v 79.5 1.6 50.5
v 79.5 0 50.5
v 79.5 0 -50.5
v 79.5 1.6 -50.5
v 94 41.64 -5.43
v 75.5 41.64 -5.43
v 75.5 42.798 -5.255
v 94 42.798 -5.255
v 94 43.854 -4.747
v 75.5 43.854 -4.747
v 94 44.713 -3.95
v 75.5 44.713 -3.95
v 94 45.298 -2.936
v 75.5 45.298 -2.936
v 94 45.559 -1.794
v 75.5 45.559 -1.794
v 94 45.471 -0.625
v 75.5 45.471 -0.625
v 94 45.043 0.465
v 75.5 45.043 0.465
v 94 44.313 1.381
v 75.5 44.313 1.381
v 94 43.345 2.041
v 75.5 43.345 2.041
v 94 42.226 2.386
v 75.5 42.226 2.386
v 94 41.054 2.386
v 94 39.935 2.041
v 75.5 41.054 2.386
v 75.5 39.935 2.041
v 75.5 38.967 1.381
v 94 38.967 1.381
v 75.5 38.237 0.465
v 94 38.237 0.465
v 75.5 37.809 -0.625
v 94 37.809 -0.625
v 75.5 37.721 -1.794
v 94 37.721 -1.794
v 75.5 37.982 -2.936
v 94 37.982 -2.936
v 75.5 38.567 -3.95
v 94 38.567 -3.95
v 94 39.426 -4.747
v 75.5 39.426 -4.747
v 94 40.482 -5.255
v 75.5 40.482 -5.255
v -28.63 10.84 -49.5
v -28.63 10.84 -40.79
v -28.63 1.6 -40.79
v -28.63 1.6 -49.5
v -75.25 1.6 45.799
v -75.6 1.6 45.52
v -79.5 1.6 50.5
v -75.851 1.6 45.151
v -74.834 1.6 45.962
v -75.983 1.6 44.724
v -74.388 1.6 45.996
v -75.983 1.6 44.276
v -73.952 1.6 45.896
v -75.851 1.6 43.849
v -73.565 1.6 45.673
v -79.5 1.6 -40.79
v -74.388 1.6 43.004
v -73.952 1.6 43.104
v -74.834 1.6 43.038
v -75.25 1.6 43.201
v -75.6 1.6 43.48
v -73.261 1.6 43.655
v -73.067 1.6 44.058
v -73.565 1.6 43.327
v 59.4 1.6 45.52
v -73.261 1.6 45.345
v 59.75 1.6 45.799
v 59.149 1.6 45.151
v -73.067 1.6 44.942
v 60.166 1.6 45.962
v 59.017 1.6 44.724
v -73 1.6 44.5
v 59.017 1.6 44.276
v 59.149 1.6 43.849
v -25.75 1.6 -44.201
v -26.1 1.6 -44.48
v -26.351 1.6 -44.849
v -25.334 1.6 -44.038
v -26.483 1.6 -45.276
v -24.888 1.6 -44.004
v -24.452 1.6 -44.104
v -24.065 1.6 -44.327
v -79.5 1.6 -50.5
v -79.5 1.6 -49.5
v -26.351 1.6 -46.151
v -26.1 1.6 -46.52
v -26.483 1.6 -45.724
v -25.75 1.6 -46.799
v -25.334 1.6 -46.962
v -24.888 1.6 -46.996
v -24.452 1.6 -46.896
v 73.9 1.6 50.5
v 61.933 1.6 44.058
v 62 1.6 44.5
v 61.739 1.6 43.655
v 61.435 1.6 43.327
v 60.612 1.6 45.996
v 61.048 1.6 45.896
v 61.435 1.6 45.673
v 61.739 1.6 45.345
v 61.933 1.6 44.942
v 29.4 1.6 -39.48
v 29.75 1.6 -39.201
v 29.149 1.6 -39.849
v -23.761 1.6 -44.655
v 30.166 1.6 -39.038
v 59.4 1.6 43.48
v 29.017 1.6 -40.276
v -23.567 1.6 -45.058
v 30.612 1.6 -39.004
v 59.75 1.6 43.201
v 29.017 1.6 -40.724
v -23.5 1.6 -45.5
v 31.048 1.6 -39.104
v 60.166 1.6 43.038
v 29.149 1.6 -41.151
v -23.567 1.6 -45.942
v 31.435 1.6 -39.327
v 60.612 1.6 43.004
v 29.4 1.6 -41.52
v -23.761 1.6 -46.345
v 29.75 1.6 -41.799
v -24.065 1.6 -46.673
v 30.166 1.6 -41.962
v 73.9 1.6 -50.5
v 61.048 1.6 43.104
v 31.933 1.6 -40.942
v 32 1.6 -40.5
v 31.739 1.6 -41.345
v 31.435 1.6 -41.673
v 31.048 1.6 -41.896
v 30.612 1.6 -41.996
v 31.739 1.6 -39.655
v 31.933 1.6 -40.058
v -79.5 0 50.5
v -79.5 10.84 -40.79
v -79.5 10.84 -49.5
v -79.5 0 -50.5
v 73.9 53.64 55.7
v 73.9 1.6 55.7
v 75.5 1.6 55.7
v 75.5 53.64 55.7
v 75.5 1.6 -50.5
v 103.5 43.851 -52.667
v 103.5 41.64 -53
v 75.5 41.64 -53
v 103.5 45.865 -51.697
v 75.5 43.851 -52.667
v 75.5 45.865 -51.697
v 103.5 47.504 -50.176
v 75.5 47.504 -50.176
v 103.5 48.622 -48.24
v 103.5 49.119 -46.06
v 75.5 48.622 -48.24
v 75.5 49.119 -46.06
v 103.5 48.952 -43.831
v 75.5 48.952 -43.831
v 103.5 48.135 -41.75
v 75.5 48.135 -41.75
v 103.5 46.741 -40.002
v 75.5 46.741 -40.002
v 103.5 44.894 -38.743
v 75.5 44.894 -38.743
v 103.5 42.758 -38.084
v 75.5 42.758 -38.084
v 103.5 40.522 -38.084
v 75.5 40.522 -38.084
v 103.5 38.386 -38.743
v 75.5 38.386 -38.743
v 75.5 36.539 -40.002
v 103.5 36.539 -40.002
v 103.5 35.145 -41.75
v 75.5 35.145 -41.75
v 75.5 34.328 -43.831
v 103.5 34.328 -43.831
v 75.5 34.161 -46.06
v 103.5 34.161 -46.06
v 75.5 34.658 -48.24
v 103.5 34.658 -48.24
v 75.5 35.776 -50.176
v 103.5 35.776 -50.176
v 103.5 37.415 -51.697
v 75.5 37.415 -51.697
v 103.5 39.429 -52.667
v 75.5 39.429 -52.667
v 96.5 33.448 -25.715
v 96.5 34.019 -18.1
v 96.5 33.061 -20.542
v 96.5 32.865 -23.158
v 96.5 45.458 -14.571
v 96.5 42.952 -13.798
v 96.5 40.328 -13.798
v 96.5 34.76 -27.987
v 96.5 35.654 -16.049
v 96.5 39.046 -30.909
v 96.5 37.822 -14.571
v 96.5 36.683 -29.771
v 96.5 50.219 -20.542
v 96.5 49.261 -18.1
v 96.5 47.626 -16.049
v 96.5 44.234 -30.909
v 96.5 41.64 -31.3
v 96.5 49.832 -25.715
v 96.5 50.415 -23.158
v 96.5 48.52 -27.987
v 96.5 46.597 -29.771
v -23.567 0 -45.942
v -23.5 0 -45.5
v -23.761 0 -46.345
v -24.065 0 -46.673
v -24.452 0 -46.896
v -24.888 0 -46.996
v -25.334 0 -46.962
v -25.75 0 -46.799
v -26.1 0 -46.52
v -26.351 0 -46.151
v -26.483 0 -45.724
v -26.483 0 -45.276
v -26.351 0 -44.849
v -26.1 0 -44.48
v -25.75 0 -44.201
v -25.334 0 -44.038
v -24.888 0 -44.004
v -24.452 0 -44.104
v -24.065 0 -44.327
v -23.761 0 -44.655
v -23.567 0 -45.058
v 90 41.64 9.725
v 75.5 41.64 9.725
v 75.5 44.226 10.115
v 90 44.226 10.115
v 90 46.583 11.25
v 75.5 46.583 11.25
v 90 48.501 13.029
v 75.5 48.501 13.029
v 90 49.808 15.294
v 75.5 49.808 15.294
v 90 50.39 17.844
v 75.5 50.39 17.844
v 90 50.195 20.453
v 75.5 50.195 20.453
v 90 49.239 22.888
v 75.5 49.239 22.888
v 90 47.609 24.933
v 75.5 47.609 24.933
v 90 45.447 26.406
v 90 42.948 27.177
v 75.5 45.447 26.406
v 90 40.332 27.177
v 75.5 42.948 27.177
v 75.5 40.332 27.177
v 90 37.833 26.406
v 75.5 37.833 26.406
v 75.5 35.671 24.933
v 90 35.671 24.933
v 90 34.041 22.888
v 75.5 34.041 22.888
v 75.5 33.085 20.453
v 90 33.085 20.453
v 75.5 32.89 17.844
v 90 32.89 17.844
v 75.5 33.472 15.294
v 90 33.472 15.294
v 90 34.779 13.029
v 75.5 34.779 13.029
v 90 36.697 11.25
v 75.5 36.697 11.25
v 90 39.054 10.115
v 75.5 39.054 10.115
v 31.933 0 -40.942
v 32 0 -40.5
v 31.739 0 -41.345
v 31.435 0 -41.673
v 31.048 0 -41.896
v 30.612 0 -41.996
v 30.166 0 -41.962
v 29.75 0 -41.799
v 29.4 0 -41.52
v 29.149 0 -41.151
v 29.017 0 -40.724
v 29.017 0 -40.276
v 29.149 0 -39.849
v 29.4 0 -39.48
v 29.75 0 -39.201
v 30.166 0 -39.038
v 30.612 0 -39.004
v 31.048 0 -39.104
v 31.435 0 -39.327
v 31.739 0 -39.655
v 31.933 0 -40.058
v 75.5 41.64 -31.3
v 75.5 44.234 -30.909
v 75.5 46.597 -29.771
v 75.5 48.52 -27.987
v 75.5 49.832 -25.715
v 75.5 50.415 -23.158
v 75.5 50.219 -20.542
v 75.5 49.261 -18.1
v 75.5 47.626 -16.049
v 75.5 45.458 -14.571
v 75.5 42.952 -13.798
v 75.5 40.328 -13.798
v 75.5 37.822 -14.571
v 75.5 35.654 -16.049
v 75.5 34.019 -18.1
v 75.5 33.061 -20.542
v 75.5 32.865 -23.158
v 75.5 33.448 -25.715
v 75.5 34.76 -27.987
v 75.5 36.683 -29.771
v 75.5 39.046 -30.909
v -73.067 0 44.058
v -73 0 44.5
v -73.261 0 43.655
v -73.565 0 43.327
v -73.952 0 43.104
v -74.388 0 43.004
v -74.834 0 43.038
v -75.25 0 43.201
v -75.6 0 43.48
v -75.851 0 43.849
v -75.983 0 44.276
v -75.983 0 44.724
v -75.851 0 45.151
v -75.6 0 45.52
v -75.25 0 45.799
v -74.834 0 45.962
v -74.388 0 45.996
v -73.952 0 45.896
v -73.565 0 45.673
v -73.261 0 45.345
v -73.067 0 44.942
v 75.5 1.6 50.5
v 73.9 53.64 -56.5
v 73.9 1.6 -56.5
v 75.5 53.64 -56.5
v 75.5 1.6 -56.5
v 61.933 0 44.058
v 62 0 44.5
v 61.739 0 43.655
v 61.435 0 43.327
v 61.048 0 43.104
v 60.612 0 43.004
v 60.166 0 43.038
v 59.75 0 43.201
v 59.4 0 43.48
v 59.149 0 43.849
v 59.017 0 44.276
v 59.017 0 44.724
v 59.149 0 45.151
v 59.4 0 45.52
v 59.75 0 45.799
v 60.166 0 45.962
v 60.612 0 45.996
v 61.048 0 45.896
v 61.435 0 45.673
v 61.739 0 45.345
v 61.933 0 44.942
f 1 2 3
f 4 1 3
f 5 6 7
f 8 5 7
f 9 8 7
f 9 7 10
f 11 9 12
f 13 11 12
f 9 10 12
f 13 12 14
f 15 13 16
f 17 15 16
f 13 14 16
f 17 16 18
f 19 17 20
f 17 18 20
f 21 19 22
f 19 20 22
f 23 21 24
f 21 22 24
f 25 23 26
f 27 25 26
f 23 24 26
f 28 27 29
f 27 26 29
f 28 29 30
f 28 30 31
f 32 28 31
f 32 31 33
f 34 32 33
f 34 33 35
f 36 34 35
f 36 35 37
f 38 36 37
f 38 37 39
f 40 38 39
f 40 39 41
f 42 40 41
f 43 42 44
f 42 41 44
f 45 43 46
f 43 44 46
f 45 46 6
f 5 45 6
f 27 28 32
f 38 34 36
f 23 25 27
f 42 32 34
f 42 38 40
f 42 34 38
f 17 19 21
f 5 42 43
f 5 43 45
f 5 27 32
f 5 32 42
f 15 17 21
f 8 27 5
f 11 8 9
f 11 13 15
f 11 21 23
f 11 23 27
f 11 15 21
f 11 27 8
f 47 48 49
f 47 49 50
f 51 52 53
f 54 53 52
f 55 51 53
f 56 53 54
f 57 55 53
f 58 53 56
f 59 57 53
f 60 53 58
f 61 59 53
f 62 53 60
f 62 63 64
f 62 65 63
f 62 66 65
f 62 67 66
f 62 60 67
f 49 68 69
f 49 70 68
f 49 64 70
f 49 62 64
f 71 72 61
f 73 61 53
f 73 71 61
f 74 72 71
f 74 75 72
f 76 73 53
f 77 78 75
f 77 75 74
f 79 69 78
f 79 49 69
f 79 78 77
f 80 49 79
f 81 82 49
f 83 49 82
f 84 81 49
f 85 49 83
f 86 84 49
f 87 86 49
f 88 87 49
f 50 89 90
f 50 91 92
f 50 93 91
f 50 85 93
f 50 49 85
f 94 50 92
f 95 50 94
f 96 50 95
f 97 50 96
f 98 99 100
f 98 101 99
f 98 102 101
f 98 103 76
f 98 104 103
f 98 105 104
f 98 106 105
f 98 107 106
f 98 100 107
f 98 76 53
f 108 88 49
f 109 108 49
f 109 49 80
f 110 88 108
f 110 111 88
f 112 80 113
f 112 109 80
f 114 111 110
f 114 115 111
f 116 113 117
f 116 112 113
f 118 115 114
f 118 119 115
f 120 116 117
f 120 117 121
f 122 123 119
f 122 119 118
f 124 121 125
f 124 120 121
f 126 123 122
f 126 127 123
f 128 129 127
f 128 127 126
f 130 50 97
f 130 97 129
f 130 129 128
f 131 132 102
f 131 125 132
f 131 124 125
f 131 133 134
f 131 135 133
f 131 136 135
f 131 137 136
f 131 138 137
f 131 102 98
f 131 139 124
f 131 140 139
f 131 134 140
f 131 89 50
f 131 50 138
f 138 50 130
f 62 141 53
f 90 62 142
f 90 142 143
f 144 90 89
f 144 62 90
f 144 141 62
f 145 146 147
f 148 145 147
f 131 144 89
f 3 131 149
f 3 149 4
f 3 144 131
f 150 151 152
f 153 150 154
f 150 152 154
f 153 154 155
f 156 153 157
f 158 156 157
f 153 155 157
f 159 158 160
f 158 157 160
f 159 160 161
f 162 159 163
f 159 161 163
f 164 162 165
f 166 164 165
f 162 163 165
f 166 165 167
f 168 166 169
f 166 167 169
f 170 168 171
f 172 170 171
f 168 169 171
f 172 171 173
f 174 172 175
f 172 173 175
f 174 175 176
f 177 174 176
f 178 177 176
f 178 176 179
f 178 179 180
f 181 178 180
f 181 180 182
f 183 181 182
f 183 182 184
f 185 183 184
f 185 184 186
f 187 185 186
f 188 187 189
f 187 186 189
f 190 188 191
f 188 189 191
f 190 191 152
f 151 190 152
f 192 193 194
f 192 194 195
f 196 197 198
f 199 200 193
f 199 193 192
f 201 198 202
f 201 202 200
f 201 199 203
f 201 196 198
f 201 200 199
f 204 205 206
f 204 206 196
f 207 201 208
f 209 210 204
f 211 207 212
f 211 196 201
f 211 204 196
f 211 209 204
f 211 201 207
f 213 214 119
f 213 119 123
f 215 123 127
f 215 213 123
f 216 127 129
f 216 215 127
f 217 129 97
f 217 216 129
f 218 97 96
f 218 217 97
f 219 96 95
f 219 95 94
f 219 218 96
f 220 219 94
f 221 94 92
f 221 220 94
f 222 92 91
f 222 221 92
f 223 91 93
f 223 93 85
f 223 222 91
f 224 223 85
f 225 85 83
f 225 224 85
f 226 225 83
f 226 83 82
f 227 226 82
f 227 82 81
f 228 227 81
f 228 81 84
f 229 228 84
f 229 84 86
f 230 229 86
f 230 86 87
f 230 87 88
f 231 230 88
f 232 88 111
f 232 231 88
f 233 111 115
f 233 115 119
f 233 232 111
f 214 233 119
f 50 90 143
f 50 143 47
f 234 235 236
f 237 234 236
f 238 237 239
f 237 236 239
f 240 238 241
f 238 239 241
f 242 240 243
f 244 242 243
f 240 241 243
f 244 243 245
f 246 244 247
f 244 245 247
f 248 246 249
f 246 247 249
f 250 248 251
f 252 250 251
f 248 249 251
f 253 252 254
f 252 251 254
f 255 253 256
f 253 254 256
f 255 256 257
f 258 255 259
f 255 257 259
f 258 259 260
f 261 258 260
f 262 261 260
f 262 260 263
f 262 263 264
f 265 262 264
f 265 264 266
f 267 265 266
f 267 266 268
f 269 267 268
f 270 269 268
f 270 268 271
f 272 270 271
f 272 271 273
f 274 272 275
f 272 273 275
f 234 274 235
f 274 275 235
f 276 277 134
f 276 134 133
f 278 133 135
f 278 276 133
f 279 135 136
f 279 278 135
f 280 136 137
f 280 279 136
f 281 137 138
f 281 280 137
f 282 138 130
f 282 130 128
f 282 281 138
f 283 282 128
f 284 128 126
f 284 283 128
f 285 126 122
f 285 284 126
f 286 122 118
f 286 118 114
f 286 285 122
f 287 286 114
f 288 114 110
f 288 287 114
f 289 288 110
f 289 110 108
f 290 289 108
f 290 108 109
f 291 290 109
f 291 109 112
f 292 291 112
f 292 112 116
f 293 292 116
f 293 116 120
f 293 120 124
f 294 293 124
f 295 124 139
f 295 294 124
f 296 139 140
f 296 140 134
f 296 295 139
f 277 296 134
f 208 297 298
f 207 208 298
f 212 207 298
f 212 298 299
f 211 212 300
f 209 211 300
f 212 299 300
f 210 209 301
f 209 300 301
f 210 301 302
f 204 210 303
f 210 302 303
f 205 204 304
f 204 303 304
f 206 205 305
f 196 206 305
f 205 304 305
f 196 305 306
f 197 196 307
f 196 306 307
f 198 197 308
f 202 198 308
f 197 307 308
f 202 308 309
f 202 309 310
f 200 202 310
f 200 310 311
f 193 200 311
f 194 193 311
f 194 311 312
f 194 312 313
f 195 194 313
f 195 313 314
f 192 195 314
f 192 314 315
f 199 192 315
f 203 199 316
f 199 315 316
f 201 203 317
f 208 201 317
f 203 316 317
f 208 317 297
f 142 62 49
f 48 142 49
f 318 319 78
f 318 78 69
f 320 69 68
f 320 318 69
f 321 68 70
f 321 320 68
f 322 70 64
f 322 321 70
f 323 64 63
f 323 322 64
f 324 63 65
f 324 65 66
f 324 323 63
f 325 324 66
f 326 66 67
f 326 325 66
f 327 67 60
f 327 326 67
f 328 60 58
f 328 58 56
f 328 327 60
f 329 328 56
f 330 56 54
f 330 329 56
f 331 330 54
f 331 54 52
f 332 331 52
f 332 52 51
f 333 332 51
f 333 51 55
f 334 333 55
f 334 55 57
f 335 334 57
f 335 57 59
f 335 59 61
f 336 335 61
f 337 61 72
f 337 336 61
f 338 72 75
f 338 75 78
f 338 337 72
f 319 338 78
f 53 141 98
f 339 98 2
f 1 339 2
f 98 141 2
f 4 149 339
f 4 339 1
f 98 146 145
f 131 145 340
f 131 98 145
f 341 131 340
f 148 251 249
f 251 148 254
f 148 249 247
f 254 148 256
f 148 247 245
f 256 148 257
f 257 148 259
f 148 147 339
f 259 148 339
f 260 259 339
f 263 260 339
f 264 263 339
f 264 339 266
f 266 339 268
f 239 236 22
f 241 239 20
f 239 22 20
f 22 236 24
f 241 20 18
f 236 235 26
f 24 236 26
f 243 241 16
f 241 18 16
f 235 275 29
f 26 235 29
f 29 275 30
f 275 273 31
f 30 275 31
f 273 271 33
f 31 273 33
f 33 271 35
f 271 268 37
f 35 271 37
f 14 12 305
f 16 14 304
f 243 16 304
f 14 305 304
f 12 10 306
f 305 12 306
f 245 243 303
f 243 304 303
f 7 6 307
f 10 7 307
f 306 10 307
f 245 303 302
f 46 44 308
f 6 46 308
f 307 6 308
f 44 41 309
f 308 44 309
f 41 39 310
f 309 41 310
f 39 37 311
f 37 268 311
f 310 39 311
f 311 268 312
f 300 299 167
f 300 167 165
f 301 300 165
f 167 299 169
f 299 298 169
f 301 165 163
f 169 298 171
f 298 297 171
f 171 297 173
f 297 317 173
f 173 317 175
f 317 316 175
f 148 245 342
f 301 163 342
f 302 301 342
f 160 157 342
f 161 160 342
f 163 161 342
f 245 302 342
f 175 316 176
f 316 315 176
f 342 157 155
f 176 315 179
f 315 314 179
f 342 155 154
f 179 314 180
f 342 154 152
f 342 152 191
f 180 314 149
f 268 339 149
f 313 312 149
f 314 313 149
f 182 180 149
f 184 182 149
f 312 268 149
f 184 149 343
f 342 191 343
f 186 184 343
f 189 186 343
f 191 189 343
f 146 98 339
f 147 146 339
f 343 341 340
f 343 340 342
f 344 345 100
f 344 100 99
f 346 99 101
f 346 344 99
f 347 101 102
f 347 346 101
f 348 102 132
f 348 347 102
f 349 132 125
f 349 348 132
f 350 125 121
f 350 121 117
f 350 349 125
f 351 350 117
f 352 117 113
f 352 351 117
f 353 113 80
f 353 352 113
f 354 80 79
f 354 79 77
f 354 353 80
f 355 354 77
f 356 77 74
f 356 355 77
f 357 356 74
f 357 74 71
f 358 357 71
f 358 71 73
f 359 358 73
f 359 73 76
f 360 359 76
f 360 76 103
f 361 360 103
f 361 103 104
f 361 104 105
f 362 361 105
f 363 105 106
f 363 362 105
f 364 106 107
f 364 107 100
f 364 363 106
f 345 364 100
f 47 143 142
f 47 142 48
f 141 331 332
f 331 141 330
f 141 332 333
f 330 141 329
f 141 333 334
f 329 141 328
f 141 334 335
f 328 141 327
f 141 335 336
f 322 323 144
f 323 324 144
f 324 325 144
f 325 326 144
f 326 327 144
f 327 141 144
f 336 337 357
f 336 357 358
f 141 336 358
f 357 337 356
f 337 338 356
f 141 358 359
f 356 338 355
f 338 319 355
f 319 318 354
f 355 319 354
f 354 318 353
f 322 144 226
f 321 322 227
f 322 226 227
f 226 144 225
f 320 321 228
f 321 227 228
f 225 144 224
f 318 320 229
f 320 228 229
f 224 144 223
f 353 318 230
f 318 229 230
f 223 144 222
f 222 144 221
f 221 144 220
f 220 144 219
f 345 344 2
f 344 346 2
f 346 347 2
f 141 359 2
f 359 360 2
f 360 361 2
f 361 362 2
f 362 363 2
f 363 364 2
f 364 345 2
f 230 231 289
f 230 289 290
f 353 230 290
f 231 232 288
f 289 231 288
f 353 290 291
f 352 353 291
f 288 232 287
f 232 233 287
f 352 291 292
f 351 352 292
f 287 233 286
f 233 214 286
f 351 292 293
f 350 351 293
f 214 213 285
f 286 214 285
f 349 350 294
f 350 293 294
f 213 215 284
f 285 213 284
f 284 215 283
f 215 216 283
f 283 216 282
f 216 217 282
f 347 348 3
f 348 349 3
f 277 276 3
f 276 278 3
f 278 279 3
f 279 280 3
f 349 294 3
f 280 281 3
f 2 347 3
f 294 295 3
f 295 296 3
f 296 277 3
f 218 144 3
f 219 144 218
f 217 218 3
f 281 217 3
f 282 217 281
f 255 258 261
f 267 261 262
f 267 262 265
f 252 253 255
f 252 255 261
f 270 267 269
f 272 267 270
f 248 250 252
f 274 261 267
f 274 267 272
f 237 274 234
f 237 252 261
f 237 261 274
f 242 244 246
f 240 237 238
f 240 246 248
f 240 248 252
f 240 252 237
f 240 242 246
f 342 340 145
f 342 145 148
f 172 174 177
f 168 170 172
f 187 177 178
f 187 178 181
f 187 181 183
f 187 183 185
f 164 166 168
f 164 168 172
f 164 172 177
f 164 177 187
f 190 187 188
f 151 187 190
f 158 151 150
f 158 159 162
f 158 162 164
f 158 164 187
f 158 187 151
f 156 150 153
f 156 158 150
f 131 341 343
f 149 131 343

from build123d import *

# Parameters (mm, degrees)
SKETCH1_W                = 159
SKETCH1_H                = 101
SKETCH1_R                = 1.5
MAIN_BOARD_DEPTH         = 1.6
SKETCH2_W                = 50.87
SKETCH2_H                = 8.71
CONNECTOR_DEPTH          = 9.24
SKETCH3_W                = 1.6
SKETCH3_H                = 112.2
CONNECTOR_BOARD_DEPTH    = 52.04
SKETCH4_R                = 7.5
CAN_CONNECTOR_DEPTH      = 28
SKETCH5_R                = 8.8
MAIN_LV_CONNECTOR_DEPTH  = 21
SKETCH6_R                = 3.93
SERIAL_CONNECTOR_DEPTH   = 18.5
SKETCH7_R                = 8.775
FEEDBACK_CONNECTOR_DEPTH = 14.5


with BuildPart() as part:
    # Sketch1 → Main Board (new body)
    with BuildSketch(Plane(origin=(0, 0, 0), x_dir=(1, 0, 0), z_dir=(0, 1, 0))):
        Rectangle(SKETCH1_W, SKETCH1_H)
        with Locations((-25, 45.5)):
            Circle(SKETCH1_R, mode=Mode.SUBTRACT)
        with Locations((30.5, 40.5)):
            Circle(SKETCH1_R, mode=Mode.SUBTRACT)
        with Locations((-74.5, -44.5)):
            Circle(SKETCH1_R, mode=Mode.SUBTRACT)
        with Locations((60.5, -44.5)):
            Circle(SKETCH1_R, mode=Mode.SUBTRACT)
    extrude(amount=MAIN_BOARD_DEPTH)

    # Sketch2 → Connector (add)
    with BuildSketch(Plane(origin=(0, 1.6, 0), x_dir=(1, 0, 0), z_dir=(0, 1, 0))):
        with Locations((-54.065, 45.145)):
            Rectangle(SKETCH2_W, SKETCH2_H)
    extrude(amount=CONNECTOR_DEPTH)

    # Sketch3 → Connector Board (add)
    with BuildSketch(Plane(origin=(0, 1.6, 0), x_dir=(1, 0, 0), z_dir=(0, 1, 0))):
        with Locations((74.7, 0.4)):
            Rectangle(SKETCH3_W, SKETCH3_H)
    extrude(amount=CONNECTOR_BOARD_DEPTH)

    # Sketch4 → CAN Connector (add)
    with BuildSketch(Plane(origin=(75.5, 0, 0), x_dir=(0, 0, -1), z_dir=(1, 0, 0))):
        with Locations((45.5, 41.64)):
            Circle(SKETCH4_R)
    extrude(amount=CAN_CONNECTOR_DEPTH)

    # Sketch5 → Main LV Connector (add)
    with BuildSketch(Plane(origin=(75.5, 0, 0), x_dir=(0, 0, -1), z_dir=(1, 0, 0))):
        with Locations((22.5, 41.64)):
            Circle(SKETCH5_R)
    extrude(amount=MAIN_LV_CONNECTOR_DEPTH)

    # Sketch6 → Serial Connector (add)
    with BuildSketch(Plane(origin=(75.5, 0, 0), x_dir=(0, 0, -1), z_dir=(1, 0, 0))):
        with Locations((1.5, 41.64)):
            Circle(SKETCH6_R)
    extrude(amount=SERIAL_CONNECTOR_DEPTH)

    # Sketch7 → Feedback Connector (add)
    with BuildSketch(Plane(origin=(75.5, 0, 0), x_dir=(0, 0, -1), z_dir=(1, 0, 0))):
        with Locations((-18.5, 41.64)):
            Circle(SKETCH7_R)
    extrude(amount=FEEDBACK_CONNECTOR_DEPTH)


solid = part.part
